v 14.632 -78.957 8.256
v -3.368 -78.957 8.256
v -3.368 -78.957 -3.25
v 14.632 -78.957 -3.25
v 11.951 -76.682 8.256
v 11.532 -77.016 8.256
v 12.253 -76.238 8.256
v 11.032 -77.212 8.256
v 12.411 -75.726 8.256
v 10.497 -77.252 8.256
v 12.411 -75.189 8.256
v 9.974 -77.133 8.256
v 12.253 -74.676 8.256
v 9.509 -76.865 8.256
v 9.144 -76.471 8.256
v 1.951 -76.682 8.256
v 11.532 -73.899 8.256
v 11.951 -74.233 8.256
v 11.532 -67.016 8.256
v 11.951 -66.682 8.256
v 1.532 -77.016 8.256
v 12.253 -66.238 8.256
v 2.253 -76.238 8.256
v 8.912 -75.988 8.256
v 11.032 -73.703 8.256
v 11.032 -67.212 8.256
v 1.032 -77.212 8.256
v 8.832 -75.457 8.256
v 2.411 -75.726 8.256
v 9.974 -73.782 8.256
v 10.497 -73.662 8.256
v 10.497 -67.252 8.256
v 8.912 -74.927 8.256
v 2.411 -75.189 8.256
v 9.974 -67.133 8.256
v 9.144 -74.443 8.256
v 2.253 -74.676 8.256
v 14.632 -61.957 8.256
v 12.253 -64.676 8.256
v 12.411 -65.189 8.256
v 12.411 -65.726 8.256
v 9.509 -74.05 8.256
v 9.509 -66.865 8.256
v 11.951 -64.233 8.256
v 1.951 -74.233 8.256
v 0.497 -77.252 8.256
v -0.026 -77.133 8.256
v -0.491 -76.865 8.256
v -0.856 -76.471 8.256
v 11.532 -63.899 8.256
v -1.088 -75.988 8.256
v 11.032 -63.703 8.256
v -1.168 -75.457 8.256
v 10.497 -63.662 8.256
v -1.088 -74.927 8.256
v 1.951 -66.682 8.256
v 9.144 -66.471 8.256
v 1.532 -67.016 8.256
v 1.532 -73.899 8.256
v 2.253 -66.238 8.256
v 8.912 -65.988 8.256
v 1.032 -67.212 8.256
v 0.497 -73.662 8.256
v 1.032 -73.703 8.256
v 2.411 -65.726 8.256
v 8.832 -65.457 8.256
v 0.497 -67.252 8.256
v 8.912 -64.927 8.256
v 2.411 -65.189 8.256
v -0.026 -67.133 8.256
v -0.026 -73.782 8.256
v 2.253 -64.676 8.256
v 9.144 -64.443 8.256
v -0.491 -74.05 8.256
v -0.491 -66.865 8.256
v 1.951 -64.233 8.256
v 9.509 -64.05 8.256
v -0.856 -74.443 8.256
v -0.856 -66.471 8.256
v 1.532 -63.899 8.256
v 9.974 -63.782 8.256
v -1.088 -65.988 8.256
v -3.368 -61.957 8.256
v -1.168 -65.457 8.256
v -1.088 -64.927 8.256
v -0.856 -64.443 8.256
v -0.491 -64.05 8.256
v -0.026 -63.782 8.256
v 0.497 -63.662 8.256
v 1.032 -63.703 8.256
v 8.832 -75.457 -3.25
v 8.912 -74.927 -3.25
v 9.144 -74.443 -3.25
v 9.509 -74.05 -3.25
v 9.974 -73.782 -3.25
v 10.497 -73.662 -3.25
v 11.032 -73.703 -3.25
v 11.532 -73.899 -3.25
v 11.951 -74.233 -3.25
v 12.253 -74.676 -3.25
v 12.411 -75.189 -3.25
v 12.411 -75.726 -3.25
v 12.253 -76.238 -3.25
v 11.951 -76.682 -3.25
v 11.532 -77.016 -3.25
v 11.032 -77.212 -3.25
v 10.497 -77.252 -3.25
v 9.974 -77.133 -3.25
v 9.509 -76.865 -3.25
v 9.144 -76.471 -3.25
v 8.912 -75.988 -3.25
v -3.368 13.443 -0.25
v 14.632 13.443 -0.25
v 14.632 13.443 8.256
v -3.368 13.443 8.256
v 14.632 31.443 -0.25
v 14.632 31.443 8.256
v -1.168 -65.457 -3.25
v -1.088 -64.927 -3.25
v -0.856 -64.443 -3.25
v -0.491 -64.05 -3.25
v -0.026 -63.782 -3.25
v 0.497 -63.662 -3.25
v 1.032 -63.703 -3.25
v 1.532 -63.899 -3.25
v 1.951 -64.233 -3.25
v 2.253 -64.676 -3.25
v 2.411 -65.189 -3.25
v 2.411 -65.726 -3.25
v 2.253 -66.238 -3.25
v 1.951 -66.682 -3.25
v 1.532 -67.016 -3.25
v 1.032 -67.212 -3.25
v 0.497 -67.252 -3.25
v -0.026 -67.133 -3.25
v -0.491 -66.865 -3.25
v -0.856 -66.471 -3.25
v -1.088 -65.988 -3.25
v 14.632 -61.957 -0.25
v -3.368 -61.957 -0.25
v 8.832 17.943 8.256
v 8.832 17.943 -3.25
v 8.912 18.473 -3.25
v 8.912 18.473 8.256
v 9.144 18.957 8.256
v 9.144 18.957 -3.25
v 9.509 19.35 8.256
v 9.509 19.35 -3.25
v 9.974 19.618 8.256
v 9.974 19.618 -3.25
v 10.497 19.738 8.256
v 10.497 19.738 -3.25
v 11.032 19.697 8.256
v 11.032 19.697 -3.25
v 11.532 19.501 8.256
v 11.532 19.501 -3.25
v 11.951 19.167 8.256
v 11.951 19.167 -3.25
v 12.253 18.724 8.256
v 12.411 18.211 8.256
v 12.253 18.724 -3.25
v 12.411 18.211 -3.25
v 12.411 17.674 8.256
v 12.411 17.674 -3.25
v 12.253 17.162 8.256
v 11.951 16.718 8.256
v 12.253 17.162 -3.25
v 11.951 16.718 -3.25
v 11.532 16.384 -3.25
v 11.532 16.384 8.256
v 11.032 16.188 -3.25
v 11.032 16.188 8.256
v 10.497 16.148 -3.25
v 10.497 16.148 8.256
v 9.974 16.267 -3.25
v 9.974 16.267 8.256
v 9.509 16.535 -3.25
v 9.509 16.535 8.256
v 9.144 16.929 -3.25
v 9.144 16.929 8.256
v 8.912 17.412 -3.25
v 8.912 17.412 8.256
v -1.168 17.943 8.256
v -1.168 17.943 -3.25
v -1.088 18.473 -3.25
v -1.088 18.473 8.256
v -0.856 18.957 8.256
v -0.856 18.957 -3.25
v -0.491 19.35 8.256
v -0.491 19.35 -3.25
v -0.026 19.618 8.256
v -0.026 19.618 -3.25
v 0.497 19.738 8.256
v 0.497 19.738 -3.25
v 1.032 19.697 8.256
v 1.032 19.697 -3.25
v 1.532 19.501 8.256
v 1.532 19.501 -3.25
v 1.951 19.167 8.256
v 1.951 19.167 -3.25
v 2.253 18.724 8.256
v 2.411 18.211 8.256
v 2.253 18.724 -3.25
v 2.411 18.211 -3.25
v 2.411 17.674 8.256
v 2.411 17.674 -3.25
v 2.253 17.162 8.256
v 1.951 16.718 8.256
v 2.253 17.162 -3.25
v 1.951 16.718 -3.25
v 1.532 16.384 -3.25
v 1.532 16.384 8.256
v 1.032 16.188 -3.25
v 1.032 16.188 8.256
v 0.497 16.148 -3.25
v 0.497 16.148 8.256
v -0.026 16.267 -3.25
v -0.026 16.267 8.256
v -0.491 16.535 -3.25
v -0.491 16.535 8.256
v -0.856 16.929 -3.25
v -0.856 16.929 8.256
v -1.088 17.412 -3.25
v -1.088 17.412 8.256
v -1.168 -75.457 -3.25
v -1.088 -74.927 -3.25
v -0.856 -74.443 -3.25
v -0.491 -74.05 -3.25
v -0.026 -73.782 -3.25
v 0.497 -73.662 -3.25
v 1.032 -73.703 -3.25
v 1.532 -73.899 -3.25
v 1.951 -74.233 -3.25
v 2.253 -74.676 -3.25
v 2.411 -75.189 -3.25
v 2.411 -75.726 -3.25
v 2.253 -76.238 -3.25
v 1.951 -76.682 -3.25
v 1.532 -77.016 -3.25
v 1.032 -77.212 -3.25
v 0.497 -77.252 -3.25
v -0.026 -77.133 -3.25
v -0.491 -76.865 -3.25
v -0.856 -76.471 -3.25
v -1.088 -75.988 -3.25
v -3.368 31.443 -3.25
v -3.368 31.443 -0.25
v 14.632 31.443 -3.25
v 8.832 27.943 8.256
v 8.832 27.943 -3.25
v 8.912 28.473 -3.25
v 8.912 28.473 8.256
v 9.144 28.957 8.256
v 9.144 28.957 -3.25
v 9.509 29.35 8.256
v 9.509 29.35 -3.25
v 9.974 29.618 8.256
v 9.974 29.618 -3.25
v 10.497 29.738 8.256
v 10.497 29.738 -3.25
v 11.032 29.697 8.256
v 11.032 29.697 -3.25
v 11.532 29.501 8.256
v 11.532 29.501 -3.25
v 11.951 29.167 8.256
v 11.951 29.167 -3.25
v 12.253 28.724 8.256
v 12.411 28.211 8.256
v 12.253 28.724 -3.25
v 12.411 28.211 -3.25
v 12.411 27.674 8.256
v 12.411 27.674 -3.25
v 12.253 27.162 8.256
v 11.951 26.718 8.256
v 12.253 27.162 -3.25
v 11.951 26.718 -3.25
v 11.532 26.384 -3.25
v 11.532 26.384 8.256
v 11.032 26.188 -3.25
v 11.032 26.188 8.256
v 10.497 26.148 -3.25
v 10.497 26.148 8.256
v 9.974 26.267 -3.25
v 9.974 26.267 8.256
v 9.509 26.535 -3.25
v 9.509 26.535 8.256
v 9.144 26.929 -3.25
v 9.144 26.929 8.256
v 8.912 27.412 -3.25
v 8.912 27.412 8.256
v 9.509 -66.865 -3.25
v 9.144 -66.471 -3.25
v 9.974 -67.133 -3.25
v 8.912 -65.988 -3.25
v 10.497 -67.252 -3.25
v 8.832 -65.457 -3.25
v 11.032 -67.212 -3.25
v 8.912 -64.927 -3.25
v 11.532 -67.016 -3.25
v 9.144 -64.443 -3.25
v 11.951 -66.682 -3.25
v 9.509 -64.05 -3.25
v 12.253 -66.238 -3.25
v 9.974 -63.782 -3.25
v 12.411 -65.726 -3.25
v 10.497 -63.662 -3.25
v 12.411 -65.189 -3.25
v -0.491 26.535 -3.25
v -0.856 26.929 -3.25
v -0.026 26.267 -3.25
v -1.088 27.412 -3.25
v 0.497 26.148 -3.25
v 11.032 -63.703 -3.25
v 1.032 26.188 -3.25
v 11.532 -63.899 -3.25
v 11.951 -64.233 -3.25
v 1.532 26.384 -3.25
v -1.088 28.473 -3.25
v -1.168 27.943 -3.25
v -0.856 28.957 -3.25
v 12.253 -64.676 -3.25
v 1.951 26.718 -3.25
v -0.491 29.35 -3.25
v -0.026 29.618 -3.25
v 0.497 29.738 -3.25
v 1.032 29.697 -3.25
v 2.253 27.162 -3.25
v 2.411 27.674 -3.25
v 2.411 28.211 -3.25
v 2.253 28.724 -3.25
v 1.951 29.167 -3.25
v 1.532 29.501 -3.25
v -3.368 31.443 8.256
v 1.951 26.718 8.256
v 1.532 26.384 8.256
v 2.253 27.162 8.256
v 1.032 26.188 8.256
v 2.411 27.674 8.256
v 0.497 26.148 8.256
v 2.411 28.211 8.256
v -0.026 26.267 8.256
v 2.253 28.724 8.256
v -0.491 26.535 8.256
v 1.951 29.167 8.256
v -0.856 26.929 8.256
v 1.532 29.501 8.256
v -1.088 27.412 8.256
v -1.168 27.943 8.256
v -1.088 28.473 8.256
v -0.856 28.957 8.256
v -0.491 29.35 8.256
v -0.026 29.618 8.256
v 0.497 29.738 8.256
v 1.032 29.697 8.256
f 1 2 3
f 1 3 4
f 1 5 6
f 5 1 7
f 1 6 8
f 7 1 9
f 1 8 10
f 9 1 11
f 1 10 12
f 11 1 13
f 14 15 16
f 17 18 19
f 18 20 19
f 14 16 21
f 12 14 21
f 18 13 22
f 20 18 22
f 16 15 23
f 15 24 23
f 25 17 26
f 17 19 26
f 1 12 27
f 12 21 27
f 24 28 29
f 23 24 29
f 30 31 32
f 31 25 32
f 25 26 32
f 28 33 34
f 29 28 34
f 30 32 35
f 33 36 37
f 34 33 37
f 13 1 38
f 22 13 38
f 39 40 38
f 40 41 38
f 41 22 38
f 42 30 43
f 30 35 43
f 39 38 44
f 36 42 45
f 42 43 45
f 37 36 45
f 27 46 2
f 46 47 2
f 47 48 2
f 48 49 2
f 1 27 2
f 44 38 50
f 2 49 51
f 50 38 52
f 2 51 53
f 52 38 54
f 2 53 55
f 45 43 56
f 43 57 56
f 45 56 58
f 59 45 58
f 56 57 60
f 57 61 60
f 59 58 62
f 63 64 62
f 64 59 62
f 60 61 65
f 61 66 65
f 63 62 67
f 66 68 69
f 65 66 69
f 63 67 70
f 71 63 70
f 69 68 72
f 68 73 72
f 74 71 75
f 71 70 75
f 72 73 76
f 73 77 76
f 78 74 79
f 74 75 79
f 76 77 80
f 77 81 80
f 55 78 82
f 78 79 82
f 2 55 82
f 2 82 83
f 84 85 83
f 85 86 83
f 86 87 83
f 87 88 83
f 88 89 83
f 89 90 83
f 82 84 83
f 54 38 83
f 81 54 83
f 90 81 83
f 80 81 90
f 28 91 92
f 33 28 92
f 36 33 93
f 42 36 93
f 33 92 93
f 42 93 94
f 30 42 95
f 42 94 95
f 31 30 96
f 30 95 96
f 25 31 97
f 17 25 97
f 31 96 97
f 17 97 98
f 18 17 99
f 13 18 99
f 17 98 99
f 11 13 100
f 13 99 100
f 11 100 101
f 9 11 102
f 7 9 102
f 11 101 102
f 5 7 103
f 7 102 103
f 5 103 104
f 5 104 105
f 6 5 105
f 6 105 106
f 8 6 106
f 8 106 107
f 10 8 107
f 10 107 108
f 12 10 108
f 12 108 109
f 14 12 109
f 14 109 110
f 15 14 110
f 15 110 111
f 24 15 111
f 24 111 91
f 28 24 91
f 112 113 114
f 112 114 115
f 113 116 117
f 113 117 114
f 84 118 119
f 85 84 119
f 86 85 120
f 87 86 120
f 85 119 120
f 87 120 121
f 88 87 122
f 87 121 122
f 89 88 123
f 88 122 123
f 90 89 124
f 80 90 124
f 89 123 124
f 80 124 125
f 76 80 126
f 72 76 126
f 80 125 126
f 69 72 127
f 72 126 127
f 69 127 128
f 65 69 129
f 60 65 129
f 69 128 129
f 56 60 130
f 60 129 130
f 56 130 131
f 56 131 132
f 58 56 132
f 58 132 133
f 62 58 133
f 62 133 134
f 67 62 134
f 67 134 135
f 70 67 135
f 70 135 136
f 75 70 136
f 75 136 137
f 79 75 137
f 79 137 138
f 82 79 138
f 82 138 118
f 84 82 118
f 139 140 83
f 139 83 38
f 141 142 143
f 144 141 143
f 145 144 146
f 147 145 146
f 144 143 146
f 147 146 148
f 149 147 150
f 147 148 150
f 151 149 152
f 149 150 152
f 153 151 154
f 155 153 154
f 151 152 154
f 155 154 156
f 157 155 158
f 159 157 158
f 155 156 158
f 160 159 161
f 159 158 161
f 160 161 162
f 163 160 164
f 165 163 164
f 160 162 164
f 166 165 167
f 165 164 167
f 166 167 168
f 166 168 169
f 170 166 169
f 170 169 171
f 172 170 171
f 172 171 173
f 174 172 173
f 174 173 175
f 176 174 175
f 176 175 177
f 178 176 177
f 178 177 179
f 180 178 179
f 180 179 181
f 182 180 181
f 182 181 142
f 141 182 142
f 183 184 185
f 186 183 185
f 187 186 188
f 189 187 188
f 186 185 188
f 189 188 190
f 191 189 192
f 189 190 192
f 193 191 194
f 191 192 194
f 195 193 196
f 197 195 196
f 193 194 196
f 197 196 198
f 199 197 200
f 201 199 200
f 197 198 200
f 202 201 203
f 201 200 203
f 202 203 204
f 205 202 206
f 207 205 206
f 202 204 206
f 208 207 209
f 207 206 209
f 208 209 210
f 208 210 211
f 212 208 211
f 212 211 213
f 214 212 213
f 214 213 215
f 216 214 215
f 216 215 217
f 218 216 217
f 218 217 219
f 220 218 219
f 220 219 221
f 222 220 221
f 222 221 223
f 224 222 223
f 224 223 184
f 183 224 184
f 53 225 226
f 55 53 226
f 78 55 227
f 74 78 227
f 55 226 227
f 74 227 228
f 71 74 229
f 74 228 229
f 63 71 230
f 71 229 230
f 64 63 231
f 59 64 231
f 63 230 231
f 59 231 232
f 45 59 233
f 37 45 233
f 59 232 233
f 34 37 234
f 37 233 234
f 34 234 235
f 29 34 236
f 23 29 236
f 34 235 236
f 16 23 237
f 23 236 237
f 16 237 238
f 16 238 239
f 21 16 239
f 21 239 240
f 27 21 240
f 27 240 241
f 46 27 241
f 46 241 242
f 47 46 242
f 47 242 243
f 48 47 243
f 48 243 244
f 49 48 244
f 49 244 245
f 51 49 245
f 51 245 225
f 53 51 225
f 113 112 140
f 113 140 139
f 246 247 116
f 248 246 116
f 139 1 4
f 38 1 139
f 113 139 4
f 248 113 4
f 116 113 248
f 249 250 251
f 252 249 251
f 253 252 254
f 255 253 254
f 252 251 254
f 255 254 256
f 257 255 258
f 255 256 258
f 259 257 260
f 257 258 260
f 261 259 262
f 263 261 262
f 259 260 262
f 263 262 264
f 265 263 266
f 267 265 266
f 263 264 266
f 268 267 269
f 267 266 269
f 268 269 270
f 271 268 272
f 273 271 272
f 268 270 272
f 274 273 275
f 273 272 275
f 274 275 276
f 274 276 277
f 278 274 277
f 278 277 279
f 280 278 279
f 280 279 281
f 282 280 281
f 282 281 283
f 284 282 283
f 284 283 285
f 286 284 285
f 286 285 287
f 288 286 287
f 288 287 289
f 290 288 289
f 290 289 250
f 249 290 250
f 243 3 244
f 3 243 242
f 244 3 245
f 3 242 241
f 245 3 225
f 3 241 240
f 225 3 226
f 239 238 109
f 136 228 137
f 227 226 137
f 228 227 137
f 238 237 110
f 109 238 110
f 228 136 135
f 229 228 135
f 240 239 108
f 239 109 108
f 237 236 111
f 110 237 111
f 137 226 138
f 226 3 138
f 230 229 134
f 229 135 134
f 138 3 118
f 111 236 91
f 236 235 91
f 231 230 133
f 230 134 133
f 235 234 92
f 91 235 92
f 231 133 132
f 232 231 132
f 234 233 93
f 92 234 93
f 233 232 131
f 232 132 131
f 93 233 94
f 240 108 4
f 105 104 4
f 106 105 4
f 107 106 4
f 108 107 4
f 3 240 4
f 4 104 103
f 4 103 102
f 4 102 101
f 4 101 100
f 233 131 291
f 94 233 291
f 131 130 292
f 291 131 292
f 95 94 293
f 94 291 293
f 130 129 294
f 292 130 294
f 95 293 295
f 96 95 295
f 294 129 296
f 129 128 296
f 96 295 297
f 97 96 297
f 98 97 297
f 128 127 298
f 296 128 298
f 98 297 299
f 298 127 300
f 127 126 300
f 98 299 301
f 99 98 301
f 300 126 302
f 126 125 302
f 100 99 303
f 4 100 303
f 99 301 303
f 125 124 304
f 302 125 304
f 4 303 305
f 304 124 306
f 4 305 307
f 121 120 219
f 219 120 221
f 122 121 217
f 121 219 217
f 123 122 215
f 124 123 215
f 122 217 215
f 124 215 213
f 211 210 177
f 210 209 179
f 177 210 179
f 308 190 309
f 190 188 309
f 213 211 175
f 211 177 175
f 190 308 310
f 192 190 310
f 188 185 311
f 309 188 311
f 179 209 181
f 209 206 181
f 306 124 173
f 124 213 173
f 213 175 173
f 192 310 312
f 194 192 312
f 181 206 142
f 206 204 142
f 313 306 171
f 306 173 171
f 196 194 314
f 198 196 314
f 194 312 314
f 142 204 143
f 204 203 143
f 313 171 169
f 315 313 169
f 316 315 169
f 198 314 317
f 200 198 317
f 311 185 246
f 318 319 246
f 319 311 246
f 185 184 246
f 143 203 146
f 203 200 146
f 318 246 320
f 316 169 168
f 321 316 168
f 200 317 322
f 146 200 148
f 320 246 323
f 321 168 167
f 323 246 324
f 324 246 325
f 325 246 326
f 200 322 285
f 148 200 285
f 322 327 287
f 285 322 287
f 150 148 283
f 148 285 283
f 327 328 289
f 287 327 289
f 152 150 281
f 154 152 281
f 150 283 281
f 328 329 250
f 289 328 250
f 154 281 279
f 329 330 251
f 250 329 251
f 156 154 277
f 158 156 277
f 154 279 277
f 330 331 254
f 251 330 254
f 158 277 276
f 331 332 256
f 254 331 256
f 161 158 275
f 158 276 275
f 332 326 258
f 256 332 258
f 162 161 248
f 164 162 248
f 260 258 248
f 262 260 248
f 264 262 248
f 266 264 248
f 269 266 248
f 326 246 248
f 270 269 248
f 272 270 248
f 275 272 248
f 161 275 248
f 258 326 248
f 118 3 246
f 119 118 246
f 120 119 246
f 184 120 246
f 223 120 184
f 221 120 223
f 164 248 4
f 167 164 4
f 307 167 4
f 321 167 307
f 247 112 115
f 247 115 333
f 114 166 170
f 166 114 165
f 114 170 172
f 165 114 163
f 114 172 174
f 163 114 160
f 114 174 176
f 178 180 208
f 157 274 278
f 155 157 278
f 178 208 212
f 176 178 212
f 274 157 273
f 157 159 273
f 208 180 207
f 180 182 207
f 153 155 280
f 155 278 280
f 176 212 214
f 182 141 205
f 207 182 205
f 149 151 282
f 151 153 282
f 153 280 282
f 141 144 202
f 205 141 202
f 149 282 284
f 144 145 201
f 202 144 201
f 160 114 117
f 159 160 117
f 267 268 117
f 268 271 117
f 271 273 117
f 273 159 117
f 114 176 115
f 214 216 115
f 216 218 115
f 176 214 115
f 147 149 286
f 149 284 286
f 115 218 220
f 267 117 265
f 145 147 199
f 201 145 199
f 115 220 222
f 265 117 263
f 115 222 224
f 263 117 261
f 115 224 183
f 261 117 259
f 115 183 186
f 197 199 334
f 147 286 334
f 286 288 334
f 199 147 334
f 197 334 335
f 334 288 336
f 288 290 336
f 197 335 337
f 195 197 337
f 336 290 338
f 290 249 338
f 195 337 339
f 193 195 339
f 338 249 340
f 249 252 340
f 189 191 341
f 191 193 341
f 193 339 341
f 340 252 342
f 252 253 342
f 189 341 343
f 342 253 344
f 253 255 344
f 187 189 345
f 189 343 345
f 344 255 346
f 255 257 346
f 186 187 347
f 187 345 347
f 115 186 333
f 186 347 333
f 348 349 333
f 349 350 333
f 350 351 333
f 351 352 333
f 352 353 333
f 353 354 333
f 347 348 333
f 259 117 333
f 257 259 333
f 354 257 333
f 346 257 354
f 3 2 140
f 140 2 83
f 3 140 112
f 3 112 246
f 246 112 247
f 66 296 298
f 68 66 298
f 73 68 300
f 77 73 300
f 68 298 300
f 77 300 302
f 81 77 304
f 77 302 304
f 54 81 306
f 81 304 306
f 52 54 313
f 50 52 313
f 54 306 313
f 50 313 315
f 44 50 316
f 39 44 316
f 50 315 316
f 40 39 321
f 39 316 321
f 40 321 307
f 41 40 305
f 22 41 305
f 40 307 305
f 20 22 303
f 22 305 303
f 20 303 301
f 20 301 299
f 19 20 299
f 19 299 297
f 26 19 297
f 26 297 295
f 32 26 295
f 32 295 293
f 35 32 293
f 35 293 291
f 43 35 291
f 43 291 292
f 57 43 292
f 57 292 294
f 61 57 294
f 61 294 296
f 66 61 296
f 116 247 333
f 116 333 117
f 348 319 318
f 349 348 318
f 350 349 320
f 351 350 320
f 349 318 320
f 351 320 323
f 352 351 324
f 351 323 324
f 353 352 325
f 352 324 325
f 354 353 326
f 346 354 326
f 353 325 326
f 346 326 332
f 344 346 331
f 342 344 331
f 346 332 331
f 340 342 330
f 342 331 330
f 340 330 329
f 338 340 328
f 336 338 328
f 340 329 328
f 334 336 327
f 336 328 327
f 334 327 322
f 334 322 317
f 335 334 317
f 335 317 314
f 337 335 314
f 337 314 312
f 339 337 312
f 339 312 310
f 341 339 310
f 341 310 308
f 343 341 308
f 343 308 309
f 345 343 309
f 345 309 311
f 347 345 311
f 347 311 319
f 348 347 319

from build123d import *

# Parameters (mm, degrees)
SKETCH2_W            = 18
SKETCH2_H            = 110.4
BOSS_EXTRUDE1_DEPTH  = 3
BOSS_EXTRUDE2_DEPTH  = 8.50551692
M3_CLEARANCE_HOLE1_D = 3.6


with BuildPart() as part:
    # Sketch2 → Boss-Extrude1 (new body)
    with BuildSketch(Plane.XY.offset(-0.25)):
        with Locations((5.631550422, -23.757430205)):
            Rectangle(SKETCH2_W, SKETCH2_H)
    extrude(amount=-BOSS_EXTRUDE1_DEPTH)

    # Sketch3 → Boss-Extrude2 (add)
    with BuildSketch(Plane.XY.offset(-0.25)):
        Polygon((-3.368449578, 31.442569795), (14.631550422, 31.442569738), (14.631550364, 13.442569738), (-3.368449636, 13.442569795), align=None)
        Polygon((-3.368449578, -61.957430205), (14.631550422, -61.957430262), (14.631550422, -78.957430205), (-3.368449578, -78.957430205), align=None)
    extrude(amount=BOSS_EXTRUDE2_DEPTH)

    # M3 Clearance Hole1 (through all)
    with Locations(Plane.XY.offset(8.25551692)):
        with Locations((0.631550422, -65.457430205), (0.631550422, -75.457430205), (10.631550422, -75.457430205), (10.631550422, -65.457430205), (0.631550422, 17.942569795), (10.631550422, 17.942569795), (10.631550422, 27.942569795), (0.631550422, 27.942569795)):
            Hole(M3_CLEARANCE_HOLE1_D / 2)


solid = part.part
